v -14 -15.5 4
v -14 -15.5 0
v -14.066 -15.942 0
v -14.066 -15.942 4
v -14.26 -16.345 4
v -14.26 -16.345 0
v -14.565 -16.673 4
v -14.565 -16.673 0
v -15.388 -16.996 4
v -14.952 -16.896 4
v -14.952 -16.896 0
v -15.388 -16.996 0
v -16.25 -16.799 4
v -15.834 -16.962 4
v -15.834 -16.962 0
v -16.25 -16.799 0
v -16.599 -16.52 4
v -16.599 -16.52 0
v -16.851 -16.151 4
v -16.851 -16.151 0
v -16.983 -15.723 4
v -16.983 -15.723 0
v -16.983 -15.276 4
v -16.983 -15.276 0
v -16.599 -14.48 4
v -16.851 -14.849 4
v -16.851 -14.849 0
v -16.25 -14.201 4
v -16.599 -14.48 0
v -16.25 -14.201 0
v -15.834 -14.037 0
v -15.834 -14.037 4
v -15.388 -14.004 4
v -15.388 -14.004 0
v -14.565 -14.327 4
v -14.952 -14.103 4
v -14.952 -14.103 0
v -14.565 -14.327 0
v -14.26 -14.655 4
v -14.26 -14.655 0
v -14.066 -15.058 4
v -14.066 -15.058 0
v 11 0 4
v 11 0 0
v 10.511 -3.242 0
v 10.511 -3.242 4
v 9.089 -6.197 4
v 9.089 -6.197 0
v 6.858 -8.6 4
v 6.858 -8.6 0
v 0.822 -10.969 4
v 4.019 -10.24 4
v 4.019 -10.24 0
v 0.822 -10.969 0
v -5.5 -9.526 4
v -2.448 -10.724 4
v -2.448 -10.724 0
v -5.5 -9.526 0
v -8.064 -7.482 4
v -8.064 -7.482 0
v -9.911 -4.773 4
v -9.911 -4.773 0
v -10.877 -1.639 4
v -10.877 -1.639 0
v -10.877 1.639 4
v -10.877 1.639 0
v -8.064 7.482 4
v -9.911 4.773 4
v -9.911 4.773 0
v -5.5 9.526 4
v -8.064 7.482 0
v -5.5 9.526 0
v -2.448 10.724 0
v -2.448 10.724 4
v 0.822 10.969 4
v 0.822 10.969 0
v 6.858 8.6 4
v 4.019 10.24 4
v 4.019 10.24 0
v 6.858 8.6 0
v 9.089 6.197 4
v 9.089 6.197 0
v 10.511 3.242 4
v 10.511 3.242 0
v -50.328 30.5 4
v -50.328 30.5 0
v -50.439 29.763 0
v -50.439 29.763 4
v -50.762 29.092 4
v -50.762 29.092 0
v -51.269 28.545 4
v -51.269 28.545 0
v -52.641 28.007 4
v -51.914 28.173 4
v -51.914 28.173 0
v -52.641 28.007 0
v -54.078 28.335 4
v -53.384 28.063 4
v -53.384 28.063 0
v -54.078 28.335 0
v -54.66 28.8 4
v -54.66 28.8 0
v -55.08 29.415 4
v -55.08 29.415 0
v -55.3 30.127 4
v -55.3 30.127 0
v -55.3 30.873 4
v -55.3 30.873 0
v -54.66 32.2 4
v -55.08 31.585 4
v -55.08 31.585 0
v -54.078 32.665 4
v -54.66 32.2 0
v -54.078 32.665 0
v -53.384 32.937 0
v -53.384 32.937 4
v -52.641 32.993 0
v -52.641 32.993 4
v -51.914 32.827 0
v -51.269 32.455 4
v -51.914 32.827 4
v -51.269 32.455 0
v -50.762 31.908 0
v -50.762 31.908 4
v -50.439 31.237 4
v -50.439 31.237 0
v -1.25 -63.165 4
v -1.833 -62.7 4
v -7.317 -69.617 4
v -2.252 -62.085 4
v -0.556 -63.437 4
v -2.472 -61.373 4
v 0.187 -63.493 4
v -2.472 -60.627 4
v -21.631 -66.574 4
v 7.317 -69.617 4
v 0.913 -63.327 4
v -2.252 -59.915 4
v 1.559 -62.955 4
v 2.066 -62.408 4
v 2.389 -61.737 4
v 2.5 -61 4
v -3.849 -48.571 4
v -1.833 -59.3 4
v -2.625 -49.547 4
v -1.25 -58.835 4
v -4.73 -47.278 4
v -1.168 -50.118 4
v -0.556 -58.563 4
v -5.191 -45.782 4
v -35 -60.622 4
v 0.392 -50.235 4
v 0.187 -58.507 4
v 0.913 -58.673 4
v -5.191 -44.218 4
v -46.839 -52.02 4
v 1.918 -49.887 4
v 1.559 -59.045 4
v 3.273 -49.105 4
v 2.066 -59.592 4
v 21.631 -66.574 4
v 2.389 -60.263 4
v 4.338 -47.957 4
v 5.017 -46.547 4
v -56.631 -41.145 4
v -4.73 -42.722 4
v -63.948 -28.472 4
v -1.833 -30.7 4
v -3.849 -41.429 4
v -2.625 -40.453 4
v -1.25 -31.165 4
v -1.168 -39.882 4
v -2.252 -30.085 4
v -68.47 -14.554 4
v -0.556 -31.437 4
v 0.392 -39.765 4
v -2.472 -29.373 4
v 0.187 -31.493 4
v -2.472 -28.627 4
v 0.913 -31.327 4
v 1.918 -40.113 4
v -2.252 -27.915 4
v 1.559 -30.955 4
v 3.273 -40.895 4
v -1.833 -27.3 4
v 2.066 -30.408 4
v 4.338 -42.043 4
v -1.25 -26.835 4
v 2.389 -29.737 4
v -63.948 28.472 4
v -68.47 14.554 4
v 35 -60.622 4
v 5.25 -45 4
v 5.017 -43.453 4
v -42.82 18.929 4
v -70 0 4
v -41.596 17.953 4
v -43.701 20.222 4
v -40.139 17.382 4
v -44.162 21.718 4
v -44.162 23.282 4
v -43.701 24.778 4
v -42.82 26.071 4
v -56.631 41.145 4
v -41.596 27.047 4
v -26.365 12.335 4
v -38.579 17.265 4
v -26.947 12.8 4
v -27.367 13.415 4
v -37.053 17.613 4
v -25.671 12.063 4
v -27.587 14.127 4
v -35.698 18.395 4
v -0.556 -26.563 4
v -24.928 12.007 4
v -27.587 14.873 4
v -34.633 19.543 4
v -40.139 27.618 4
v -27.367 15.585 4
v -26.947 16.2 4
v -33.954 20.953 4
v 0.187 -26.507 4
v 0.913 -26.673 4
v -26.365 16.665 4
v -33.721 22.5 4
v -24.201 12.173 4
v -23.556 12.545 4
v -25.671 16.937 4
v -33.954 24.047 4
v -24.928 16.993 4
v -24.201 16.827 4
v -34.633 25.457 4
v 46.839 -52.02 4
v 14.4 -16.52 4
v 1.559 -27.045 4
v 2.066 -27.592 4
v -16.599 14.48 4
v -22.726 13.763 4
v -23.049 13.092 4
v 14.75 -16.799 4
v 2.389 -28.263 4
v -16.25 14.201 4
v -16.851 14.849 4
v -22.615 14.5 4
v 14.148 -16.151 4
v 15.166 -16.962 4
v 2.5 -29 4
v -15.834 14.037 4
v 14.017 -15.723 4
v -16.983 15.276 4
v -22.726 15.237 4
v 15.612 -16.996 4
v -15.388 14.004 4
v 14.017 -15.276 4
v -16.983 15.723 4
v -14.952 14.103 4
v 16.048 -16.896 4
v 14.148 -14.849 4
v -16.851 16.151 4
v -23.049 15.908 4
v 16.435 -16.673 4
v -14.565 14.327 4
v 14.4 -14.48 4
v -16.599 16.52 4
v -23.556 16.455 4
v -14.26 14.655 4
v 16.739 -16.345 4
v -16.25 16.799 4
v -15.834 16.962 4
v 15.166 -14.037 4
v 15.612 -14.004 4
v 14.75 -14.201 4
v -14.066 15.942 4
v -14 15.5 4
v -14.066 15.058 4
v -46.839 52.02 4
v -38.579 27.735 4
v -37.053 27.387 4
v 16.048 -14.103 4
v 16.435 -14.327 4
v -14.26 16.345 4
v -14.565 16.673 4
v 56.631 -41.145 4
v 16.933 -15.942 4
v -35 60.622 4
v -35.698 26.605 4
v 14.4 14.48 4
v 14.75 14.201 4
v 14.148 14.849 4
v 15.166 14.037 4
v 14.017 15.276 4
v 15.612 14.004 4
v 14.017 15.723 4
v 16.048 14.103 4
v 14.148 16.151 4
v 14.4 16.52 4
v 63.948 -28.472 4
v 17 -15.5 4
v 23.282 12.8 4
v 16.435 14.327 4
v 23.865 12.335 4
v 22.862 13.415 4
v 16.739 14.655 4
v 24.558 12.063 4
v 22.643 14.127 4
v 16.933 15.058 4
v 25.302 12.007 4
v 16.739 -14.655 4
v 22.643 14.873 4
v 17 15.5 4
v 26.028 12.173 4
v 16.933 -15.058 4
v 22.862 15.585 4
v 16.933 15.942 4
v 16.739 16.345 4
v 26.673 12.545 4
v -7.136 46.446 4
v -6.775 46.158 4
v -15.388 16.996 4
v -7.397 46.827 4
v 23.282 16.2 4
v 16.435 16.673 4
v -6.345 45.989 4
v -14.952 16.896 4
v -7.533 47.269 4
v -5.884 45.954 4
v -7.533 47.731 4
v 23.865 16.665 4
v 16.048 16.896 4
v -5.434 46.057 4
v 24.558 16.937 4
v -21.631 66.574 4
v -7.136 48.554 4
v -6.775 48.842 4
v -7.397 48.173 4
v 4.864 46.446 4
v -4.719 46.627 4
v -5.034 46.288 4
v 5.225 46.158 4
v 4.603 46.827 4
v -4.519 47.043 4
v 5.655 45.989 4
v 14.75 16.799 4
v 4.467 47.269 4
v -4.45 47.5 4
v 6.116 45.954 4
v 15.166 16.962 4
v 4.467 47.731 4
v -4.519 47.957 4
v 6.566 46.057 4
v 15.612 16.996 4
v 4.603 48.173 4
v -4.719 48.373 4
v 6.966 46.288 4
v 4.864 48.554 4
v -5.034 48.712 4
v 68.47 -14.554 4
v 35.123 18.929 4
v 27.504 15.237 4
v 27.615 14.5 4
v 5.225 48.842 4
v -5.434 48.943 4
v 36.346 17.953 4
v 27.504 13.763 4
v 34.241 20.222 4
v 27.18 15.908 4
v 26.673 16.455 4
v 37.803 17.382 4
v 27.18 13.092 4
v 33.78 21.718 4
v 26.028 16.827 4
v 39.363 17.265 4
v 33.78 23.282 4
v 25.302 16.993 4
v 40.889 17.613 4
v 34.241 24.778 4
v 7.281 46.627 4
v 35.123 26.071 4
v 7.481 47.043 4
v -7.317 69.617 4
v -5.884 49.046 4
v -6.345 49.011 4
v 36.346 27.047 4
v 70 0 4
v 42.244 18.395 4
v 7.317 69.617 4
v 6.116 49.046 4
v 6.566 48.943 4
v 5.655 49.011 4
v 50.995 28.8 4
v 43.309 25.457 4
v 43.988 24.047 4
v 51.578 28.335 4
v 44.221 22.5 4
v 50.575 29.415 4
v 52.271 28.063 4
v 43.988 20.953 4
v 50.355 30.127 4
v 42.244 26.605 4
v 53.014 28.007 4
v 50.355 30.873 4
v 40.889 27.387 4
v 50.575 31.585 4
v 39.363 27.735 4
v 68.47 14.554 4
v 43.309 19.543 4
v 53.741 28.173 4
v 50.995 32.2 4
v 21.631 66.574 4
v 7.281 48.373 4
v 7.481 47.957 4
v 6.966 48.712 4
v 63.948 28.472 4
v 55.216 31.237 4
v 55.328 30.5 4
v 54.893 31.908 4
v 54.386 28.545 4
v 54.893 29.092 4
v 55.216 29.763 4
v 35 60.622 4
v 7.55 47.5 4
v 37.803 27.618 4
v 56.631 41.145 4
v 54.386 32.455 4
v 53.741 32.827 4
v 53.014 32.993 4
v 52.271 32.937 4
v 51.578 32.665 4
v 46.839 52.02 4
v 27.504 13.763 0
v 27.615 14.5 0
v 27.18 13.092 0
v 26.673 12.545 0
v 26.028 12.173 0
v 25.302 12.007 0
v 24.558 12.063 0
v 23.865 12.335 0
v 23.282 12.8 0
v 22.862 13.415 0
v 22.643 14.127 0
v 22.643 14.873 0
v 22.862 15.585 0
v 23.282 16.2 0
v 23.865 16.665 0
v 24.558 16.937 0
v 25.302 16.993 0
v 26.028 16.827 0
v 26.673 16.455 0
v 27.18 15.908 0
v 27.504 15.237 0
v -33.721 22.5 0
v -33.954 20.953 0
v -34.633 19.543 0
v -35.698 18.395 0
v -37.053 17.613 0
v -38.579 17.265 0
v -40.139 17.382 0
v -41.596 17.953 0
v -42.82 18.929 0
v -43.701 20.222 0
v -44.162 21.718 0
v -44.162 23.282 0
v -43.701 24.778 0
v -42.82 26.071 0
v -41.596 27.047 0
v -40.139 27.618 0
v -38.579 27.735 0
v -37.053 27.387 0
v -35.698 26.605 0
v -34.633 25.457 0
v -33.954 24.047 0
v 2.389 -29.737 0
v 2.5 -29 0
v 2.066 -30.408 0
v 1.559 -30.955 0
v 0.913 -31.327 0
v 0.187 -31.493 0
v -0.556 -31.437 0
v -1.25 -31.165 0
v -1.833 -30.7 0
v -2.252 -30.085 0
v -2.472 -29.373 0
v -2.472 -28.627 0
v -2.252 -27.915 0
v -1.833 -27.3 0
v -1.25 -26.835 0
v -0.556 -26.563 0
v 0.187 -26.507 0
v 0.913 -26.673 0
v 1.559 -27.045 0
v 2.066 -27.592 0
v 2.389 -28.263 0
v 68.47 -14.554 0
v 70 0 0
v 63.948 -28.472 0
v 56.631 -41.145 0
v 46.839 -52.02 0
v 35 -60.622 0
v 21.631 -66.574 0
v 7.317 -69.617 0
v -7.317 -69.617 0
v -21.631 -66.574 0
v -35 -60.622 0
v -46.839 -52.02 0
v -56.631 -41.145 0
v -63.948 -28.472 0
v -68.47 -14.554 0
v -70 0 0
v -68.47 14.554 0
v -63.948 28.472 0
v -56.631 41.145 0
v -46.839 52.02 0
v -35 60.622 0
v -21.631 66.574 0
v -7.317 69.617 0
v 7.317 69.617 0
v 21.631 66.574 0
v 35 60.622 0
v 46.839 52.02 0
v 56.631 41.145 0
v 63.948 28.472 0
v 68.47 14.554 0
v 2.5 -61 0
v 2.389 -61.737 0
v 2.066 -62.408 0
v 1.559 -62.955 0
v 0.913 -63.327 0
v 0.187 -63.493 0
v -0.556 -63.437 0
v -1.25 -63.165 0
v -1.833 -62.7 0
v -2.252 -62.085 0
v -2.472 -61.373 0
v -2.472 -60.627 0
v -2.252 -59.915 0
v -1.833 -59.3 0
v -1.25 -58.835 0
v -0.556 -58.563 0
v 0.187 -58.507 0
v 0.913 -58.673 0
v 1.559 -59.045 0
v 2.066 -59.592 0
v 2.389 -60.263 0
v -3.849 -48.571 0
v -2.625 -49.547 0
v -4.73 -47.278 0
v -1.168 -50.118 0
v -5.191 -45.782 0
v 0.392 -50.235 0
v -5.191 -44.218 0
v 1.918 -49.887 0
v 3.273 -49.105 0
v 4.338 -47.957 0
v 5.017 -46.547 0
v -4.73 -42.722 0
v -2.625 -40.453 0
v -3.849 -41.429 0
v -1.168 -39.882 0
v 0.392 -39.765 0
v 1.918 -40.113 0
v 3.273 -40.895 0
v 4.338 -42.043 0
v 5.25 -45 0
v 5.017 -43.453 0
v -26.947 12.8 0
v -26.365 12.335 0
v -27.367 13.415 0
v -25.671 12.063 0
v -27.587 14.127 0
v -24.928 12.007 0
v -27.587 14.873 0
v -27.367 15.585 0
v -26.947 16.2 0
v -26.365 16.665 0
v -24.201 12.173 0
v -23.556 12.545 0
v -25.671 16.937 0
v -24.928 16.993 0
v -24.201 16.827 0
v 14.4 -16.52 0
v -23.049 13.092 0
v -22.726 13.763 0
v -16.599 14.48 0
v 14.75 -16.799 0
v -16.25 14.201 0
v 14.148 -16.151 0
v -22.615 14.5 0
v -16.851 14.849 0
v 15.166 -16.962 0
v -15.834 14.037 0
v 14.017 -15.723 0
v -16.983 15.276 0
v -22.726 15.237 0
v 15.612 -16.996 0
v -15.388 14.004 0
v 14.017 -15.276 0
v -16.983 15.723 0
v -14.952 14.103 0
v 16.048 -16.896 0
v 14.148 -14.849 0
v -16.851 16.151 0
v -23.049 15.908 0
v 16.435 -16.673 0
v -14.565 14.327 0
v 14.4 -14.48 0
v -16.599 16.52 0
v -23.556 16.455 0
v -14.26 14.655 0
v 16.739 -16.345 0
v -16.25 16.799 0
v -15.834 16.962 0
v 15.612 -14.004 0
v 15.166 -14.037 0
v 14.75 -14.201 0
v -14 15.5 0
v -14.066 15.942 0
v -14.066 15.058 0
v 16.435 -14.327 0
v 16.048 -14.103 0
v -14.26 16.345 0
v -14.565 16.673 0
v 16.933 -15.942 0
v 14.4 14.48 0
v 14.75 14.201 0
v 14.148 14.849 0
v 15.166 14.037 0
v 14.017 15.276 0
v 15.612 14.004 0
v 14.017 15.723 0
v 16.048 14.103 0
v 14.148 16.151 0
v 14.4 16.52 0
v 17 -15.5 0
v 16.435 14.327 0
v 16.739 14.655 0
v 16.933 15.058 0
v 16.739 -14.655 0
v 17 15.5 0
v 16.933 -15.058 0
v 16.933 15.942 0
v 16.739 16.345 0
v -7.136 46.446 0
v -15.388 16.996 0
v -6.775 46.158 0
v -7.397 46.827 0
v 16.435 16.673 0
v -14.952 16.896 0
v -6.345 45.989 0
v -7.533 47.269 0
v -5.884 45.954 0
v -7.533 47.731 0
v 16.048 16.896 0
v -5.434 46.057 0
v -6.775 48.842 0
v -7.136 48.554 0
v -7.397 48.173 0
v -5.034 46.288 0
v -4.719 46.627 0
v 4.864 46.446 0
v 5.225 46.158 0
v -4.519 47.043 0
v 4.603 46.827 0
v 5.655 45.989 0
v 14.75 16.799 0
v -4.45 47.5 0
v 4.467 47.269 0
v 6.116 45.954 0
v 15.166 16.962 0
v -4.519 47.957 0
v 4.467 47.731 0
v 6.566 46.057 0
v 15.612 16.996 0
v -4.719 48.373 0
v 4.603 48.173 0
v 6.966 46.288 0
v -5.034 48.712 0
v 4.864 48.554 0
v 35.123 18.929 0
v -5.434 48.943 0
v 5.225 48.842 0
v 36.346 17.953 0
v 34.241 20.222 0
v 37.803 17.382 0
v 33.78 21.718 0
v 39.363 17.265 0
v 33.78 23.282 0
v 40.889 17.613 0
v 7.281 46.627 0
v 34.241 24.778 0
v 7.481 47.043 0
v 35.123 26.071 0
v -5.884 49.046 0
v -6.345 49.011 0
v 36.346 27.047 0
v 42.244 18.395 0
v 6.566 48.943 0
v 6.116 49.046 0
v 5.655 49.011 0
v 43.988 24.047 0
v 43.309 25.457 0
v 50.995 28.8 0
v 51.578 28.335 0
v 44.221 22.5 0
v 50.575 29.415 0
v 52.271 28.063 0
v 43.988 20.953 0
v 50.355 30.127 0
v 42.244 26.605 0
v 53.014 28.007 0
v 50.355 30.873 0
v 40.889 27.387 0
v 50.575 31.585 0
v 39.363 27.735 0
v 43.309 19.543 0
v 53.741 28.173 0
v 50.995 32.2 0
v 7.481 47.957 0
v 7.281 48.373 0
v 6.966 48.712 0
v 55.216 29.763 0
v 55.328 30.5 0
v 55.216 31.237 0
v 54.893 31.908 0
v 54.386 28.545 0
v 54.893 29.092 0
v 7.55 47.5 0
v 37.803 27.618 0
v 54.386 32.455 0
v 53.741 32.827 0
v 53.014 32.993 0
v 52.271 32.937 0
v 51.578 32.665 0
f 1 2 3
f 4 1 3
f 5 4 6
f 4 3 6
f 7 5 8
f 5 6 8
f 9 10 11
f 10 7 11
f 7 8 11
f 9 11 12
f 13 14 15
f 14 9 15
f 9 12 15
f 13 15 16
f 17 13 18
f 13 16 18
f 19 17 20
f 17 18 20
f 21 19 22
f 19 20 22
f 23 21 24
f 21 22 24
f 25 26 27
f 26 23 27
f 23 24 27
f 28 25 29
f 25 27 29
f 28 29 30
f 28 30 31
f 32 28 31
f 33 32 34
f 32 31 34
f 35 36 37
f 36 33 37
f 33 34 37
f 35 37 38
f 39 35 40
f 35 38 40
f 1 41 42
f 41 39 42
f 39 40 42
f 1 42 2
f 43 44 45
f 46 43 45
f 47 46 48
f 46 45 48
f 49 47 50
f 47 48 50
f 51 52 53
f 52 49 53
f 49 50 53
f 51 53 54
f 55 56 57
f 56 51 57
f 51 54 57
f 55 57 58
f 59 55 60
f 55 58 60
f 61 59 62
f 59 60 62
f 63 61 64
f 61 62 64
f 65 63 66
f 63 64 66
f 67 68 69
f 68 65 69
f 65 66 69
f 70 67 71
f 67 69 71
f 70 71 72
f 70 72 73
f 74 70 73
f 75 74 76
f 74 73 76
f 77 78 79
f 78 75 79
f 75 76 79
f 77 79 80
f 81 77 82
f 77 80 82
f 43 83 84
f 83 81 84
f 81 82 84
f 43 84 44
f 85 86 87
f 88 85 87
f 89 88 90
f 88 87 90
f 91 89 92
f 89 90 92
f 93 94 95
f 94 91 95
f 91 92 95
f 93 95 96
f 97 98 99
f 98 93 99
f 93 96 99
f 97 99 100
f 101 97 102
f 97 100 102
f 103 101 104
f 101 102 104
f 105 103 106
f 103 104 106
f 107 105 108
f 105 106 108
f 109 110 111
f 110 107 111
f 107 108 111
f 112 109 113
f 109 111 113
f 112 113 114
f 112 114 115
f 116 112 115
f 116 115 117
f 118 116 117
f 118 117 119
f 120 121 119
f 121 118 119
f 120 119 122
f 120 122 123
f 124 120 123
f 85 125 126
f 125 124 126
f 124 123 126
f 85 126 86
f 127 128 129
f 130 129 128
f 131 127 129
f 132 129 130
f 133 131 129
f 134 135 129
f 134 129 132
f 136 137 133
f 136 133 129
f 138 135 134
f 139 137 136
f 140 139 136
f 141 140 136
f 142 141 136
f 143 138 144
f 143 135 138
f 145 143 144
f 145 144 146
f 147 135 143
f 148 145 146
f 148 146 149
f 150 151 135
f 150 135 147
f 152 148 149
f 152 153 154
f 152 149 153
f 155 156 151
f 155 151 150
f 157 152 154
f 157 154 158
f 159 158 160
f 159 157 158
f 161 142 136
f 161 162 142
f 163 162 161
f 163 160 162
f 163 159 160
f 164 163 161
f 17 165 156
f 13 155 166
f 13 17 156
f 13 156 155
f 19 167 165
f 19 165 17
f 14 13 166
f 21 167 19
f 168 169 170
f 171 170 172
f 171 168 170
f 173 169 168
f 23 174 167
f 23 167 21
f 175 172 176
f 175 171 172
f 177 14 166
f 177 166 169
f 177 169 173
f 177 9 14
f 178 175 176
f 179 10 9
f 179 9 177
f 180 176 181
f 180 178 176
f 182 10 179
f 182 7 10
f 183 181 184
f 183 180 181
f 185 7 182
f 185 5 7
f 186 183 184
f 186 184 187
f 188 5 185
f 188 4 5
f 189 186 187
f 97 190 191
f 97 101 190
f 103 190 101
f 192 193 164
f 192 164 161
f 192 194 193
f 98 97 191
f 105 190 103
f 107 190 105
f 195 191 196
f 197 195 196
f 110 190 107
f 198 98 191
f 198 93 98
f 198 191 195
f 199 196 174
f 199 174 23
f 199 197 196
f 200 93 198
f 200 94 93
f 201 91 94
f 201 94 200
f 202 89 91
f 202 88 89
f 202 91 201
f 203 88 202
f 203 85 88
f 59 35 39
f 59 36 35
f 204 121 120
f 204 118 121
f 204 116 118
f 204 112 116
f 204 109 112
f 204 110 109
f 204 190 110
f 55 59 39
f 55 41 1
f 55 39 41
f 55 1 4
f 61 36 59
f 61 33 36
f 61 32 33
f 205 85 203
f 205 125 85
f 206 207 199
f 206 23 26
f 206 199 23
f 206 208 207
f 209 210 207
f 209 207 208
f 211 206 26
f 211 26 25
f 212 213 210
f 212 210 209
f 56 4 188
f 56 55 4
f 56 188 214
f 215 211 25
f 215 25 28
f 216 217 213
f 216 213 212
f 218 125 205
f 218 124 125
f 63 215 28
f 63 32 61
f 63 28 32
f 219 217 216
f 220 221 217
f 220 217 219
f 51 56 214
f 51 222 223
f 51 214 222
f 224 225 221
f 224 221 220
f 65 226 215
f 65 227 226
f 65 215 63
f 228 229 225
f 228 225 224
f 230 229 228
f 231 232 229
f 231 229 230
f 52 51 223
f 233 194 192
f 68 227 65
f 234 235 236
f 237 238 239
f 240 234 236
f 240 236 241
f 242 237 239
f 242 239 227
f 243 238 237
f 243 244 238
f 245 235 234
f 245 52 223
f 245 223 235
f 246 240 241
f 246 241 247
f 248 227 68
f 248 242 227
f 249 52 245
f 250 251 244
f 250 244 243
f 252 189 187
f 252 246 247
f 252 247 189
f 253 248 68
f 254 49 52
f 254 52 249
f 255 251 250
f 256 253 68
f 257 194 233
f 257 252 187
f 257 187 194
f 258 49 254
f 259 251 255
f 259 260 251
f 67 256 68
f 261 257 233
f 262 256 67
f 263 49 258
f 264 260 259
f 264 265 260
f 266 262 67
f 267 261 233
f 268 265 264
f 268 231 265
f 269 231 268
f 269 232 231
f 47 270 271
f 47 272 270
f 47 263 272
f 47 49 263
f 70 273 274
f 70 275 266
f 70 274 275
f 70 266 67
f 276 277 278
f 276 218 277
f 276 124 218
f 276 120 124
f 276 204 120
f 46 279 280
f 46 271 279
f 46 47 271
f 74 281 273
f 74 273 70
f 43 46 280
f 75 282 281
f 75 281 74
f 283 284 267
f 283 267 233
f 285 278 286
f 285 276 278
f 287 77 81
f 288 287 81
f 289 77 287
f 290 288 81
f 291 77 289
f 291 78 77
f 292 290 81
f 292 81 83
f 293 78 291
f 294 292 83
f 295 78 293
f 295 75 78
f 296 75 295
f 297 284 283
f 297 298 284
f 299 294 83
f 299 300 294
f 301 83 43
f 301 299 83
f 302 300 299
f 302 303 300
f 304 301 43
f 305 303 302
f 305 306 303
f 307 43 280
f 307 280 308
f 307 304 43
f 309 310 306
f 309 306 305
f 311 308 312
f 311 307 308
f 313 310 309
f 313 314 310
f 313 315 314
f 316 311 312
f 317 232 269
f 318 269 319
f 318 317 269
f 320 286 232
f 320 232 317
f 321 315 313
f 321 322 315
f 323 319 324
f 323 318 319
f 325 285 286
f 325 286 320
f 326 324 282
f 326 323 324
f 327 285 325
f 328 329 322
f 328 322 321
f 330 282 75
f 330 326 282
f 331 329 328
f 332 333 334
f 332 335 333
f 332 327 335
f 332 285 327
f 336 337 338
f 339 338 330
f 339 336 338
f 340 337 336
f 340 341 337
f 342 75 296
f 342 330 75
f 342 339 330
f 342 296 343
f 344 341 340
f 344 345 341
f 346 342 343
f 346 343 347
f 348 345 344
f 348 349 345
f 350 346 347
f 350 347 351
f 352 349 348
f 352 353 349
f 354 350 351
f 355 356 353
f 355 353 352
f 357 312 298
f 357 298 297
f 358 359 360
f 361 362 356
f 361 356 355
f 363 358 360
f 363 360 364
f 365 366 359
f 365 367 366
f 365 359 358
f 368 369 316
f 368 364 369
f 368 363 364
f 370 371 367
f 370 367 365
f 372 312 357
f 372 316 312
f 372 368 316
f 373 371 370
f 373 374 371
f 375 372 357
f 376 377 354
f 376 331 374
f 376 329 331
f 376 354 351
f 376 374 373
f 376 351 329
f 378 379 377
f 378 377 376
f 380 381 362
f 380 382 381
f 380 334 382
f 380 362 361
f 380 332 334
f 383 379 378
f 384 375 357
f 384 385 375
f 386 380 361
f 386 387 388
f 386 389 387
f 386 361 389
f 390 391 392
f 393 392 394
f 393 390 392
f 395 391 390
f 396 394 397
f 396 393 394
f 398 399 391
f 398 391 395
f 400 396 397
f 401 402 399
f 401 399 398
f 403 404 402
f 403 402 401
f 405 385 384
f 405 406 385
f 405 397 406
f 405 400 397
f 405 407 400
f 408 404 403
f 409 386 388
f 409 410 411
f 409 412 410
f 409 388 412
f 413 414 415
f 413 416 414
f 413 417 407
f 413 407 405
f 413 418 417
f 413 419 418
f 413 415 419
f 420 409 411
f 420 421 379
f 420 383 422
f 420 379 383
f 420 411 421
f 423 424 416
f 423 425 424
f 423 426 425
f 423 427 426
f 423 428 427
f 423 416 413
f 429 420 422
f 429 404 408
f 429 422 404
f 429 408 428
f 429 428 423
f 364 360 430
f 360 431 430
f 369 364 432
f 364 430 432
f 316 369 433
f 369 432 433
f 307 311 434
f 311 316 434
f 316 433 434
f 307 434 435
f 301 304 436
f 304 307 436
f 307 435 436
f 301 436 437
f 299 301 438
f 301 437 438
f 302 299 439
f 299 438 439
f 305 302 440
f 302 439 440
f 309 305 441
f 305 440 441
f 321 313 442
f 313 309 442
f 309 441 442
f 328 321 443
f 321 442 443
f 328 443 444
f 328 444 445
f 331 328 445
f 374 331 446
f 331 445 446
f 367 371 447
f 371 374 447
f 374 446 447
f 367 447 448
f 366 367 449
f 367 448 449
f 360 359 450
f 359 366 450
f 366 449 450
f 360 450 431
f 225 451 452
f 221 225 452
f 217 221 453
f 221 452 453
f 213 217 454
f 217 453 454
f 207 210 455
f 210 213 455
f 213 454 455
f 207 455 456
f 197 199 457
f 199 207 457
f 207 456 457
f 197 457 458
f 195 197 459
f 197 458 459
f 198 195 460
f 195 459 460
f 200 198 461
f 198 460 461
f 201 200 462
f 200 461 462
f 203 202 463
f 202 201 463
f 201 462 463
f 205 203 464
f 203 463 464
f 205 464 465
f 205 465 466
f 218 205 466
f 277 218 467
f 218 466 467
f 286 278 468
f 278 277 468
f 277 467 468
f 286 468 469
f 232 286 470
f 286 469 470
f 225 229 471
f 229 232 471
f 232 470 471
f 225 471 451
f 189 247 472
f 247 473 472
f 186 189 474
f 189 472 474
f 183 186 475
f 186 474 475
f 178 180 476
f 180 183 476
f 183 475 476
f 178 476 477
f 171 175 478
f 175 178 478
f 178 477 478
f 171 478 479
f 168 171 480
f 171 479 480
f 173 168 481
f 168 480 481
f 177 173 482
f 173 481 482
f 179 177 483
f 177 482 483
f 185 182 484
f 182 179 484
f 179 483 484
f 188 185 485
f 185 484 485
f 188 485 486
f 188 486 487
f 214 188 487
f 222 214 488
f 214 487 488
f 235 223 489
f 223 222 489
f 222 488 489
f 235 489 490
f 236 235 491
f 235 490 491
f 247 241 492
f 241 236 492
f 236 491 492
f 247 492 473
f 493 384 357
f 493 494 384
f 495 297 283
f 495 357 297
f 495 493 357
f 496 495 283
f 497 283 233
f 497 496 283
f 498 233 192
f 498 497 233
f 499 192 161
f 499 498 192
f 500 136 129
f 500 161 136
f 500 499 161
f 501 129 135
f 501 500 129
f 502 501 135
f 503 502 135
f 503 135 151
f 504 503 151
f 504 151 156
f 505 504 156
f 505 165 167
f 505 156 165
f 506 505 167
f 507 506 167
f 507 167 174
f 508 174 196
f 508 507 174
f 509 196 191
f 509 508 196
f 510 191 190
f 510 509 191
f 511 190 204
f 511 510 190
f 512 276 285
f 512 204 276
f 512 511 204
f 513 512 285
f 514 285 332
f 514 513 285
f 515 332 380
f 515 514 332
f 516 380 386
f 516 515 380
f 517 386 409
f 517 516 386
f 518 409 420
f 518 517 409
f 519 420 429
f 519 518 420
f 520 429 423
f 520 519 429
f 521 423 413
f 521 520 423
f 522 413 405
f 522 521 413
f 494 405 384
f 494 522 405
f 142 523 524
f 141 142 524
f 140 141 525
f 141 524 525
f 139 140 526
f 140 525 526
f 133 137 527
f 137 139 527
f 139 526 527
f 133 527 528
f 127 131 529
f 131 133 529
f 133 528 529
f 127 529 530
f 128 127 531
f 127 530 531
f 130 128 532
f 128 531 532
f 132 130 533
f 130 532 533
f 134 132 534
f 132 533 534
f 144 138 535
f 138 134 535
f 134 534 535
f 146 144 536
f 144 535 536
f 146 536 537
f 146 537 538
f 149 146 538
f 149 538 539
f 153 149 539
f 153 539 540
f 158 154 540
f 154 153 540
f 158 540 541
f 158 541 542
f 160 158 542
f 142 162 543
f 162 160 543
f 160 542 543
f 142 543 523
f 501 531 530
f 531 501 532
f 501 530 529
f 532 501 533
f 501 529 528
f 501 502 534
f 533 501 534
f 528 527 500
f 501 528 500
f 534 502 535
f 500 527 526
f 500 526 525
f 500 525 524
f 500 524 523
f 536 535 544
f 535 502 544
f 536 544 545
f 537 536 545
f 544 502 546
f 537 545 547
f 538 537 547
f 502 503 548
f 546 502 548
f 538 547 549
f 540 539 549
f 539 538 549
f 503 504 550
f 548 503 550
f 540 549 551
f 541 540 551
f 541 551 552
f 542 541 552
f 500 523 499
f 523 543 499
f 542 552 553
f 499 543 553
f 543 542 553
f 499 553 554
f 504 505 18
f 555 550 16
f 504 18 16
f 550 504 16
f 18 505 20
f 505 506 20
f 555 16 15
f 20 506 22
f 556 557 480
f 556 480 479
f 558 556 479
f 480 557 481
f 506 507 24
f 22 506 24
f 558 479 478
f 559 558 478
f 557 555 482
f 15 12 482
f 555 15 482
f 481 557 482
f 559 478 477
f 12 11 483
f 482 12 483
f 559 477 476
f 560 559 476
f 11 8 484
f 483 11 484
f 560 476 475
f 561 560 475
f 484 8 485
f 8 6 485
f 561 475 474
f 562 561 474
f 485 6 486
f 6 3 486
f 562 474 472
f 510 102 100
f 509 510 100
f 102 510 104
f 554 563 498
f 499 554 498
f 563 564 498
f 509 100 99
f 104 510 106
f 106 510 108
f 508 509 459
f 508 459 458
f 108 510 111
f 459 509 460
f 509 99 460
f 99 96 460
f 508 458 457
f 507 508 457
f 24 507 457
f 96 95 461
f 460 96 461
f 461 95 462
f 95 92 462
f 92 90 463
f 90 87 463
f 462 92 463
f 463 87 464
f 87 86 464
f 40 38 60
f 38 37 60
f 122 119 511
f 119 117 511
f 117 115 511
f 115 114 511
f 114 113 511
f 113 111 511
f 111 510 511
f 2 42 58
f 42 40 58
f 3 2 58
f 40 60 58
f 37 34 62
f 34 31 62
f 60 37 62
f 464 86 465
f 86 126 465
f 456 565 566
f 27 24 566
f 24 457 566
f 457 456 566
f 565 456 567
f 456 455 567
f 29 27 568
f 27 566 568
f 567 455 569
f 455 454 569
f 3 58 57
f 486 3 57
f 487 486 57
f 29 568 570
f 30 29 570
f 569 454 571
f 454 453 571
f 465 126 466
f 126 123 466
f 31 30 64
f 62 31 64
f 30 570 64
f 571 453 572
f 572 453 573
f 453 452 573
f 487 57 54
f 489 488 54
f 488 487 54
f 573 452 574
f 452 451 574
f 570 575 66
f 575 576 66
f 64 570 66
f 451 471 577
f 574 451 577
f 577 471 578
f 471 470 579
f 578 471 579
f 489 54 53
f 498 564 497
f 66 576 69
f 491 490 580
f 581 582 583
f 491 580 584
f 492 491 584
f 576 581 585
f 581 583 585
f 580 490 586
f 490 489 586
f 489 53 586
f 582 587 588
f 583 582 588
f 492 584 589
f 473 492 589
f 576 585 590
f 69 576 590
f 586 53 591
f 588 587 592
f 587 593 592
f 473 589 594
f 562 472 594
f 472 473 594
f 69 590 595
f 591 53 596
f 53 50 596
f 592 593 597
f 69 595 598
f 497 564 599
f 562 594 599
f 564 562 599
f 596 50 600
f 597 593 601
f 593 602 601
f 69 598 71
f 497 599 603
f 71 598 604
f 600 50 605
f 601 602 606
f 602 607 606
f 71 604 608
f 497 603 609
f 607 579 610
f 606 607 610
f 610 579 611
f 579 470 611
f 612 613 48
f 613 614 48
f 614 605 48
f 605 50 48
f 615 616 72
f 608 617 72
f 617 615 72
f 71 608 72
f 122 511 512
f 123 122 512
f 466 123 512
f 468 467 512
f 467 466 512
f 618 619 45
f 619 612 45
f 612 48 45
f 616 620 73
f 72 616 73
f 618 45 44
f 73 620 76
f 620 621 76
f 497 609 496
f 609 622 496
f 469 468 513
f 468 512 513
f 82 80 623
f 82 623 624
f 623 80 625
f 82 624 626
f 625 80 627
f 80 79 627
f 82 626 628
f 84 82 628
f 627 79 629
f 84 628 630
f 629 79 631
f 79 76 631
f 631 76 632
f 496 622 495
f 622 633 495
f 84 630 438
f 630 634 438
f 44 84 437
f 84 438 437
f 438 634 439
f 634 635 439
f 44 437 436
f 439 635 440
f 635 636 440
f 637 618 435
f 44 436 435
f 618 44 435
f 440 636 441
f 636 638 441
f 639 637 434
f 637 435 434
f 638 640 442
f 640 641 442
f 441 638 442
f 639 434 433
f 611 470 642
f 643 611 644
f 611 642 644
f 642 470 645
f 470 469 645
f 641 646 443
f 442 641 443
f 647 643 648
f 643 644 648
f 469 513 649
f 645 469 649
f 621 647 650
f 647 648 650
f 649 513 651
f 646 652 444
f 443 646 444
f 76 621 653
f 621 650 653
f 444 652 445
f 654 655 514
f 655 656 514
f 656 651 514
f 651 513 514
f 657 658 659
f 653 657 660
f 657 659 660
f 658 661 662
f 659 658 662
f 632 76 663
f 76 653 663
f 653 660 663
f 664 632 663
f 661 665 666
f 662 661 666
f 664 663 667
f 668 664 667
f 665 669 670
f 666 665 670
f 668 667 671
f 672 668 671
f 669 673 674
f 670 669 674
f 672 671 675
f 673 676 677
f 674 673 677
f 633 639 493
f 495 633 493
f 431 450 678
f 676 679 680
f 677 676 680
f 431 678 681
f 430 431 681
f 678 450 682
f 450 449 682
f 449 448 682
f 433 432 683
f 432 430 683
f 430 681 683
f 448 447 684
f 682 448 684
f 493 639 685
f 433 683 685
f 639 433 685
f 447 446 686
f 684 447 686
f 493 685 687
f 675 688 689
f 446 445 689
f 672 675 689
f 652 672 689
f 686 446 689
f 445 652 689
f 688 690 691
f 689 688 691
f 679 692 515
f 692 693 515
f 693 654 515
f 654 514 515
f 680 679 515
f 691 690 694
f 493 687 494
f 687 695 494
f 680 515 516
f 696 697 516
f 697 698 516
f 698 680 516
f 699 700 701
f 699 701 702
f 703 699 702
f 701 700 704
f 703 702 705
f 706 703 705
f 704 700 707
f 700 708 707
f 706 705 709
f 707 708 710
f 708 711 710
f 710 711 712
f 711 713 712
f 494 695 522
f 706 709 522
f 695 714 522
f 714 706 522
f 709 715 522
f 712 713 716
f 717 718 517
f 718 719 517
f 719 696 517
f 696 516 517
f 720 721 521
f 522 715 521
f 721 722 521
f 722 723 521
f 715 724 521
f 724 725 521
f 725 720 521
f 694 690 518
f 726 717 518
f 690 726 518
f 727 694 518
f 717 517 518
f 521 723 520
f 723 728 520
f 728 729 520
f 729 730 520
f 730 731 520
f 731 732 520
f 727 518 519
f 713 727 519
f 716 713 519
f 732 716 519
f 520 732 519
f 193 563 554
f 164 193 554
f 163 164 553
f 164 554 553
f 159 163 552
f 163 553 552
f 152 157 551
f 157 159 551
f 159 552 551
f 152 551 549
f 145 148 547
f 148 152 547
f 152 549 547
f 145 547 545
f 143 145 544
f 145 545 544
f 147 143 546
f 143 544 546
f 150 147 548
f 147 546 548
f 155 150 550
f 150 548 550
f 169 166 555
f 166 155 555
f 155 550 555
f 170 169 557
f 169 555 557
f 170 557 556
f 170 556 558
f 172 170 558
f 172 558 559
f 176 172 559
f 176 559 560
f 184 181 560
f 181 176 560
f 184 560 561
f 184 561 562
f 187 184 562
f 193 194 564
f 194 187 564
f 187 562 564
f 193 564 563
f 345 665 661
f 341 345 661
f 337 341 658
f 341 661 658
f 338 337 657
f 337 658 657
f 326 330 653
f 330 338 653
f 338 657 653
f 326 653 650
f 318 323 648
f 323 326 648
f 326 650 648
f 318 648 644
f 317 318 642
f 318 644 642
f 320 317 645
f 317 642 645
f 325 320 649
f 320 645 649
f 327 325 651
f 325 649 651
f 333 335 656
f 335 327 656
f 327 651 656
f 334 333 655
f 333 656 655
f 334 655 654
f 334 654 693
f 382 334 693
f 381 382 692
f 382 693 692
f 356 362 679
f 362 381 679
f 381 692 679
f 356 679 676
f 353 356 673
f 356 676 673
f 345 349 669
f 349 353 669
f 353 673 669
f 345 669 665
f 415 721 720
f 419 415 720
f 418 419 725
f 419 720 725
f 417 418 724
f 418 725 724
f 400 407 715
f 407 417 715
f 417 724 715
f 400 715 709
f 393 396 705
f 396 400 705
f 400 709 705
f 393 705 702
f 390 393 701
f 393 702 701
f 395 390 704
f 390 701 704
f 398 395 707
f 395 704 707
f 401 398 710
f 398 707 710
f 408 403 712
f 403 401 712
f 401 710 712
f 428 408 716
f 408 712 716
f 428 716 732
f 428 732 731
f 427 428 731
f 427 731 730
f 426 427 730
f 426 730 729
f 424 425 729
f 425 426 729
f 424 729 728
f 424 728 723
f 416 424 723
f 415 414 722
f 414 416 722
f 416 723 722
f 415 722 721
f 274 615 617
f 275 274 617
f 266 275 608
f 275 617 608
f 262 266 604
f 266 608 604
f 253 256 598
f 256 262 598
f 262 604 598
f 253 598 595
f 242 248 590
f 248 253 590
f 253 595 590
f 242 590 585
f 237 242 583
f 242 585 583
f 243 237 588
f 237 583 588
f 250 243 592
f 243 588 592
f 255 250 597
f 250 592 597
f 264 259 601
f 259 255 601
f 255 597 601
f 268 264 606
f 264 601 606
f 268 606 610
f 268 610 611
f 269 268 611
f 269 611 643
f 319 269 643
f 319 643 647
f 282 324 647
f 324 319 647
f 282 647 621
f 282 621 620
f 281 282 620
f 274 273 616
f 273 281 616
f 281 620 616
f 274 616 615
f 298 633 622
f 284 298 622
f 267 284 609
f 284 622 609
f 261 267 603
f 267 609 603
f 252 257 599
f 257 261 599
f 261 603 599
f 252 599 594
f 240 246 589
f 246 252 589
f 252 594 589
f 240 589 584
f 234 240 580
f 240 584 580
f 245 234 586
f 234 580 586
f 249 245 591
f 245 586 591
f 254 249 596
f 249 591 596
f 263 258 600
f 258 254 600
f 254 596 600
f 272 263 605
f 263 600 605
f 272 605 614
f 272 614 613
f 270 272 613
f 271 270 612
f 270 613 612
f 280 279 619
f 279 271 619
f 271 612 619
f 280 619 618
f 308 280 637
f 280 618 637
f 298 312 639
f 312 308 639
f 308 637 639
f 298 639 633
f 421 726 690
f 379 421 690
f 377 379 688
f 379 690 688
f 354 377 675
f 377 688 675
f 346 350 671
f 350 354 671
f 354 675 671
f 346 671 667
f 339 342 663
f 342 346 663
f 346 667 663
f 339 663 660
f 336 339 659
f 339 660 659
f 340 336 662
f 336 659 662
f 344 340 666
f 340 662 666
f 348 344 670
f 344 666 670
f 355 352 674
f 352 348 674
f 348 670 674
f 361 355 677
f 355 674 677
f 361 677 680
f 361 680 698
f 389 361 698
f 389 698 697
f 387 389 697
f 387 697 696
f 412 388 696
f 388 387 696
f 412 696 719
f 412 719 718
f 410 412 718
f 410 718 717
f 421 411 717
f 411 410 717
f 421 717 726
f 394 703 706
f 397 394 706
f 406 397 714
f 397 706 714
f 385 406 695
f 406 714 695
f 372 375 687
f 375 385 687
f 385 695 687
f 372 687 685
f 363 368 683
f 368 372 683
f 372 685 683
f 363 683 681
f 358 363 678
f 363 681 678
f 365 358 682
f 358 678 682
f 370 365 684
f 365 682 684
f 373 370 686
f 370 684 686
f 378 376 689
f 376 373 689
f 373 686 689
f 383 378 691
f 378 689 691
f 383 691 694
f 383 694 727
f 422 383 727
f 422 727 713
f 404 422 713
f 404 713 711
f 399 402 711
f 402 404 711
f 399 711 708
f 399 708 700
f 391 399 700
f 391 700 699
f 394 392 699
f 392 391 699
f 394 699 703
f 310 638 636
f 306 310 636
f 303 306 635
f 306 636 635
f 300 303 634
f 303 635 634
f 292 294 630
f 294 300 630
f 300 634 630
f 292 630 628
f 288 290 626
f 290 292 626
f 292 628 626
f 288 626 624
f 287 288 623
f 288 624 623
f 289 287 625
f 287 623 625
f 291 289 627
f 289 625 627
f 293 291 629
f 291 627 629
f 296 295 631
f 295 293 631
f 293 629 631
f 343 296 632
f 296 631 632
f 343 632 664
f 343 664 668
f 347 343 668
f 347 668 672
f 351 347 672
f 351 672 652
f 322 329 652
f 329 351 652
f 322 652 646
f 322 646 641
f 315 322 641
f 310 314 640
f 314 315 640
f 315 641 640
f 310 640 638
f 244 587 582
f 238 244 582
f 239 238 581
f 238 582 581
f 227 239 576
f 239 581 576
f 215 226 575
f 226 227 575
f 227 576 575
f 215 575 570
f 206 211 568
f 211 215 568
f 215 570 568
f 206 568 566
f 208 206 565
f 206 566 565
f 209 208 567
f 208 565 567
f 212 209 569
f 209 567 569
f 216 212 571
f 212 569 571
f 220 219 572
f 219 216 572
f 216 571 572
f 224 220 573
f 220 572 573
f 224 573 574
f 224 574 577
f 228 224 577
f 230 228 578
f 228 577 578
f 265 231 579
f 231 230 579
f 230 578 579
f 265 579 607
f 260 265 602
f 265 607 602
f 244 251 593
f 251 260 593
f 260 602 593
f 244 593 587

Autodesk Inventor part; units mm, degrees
ref_plane "YZ Plane" through (0, 0, 0) normal (1, 0, 0) x (0, 1, 0)
ref_plane "XZ Plane" through (0, 0, 0) normal (0, 1, 0) x (-1, 0, 0)
ref_plane "XY Plane" through (0, 0, 0) normal (0, 0, 1) x (1, 0, 0)
sketch "Sketch1" plane through (0, 0, 0) normal (0, 0, 1) x (1, 0, 0)
  circle A0 centre (0, 0) radius 70
  circle A1 centre (0, -45) radius 5.25
  circle A2 centre (0, 0) radius 11
  circle A3 centre (6, 47.5) radius 1.55
  circle A4 centre (-6, 47.5) radius 1.55
  circle A5 centre (15.4998, 15.4998) radius 1.5
  circle A6 centre (0, -29) radius 2.5
  circle A7 centre (0, -61) radius 2.5
  circle A8 centre (52.8275, 30.5) radius 2.5
  circle A9 centre (38.9711, 22.5) radius 5.25
  circle A10 centre (25.1147, 14.5) radius 2.5
  circle A11 centre (-52.8275, 30.5) radius 2.5
  circle A12 centre (-38.9711, 22.5) radius 5.25
  circle A13 centre (-25.1147, 14.5) radius 2.5
  circle A14 centre (0, 0) radius 21.92 construction
  circle A15 centre (-15.4998, 15.4998) radius 1.5
  circle A16 centre (-15.4998, -15.4998) radius 1.5
  circle A17 centre (15.4998, -15.4998) radius 1.5
  dimension "d53" = 43.84
  dimension "D_B" = 140
  dimension "Furos" = 10.5
  dimension "d11" = 22
  dimension "d24" = 3.1
  dimension "d25" = 3.1
  dimension "FN" = 3
  dimension "d31" = 5
  dimension "d32" = 5
  dimension "d34" = 16
  dimension "d35" = 16
  dimension "d39" = 47.5
  dimension "d40" = 45
  dimension "d50" = 360
  dimension "d56" = 360
  dimension "d58" = 15.4998
  dimension "d59" = 15.4998
  dimension "d60" = 12
  dimension "d61" = 6
extrude "Extrusion1" add sketch "Sketch1" along normal blind 4
properties part number "Topo"
